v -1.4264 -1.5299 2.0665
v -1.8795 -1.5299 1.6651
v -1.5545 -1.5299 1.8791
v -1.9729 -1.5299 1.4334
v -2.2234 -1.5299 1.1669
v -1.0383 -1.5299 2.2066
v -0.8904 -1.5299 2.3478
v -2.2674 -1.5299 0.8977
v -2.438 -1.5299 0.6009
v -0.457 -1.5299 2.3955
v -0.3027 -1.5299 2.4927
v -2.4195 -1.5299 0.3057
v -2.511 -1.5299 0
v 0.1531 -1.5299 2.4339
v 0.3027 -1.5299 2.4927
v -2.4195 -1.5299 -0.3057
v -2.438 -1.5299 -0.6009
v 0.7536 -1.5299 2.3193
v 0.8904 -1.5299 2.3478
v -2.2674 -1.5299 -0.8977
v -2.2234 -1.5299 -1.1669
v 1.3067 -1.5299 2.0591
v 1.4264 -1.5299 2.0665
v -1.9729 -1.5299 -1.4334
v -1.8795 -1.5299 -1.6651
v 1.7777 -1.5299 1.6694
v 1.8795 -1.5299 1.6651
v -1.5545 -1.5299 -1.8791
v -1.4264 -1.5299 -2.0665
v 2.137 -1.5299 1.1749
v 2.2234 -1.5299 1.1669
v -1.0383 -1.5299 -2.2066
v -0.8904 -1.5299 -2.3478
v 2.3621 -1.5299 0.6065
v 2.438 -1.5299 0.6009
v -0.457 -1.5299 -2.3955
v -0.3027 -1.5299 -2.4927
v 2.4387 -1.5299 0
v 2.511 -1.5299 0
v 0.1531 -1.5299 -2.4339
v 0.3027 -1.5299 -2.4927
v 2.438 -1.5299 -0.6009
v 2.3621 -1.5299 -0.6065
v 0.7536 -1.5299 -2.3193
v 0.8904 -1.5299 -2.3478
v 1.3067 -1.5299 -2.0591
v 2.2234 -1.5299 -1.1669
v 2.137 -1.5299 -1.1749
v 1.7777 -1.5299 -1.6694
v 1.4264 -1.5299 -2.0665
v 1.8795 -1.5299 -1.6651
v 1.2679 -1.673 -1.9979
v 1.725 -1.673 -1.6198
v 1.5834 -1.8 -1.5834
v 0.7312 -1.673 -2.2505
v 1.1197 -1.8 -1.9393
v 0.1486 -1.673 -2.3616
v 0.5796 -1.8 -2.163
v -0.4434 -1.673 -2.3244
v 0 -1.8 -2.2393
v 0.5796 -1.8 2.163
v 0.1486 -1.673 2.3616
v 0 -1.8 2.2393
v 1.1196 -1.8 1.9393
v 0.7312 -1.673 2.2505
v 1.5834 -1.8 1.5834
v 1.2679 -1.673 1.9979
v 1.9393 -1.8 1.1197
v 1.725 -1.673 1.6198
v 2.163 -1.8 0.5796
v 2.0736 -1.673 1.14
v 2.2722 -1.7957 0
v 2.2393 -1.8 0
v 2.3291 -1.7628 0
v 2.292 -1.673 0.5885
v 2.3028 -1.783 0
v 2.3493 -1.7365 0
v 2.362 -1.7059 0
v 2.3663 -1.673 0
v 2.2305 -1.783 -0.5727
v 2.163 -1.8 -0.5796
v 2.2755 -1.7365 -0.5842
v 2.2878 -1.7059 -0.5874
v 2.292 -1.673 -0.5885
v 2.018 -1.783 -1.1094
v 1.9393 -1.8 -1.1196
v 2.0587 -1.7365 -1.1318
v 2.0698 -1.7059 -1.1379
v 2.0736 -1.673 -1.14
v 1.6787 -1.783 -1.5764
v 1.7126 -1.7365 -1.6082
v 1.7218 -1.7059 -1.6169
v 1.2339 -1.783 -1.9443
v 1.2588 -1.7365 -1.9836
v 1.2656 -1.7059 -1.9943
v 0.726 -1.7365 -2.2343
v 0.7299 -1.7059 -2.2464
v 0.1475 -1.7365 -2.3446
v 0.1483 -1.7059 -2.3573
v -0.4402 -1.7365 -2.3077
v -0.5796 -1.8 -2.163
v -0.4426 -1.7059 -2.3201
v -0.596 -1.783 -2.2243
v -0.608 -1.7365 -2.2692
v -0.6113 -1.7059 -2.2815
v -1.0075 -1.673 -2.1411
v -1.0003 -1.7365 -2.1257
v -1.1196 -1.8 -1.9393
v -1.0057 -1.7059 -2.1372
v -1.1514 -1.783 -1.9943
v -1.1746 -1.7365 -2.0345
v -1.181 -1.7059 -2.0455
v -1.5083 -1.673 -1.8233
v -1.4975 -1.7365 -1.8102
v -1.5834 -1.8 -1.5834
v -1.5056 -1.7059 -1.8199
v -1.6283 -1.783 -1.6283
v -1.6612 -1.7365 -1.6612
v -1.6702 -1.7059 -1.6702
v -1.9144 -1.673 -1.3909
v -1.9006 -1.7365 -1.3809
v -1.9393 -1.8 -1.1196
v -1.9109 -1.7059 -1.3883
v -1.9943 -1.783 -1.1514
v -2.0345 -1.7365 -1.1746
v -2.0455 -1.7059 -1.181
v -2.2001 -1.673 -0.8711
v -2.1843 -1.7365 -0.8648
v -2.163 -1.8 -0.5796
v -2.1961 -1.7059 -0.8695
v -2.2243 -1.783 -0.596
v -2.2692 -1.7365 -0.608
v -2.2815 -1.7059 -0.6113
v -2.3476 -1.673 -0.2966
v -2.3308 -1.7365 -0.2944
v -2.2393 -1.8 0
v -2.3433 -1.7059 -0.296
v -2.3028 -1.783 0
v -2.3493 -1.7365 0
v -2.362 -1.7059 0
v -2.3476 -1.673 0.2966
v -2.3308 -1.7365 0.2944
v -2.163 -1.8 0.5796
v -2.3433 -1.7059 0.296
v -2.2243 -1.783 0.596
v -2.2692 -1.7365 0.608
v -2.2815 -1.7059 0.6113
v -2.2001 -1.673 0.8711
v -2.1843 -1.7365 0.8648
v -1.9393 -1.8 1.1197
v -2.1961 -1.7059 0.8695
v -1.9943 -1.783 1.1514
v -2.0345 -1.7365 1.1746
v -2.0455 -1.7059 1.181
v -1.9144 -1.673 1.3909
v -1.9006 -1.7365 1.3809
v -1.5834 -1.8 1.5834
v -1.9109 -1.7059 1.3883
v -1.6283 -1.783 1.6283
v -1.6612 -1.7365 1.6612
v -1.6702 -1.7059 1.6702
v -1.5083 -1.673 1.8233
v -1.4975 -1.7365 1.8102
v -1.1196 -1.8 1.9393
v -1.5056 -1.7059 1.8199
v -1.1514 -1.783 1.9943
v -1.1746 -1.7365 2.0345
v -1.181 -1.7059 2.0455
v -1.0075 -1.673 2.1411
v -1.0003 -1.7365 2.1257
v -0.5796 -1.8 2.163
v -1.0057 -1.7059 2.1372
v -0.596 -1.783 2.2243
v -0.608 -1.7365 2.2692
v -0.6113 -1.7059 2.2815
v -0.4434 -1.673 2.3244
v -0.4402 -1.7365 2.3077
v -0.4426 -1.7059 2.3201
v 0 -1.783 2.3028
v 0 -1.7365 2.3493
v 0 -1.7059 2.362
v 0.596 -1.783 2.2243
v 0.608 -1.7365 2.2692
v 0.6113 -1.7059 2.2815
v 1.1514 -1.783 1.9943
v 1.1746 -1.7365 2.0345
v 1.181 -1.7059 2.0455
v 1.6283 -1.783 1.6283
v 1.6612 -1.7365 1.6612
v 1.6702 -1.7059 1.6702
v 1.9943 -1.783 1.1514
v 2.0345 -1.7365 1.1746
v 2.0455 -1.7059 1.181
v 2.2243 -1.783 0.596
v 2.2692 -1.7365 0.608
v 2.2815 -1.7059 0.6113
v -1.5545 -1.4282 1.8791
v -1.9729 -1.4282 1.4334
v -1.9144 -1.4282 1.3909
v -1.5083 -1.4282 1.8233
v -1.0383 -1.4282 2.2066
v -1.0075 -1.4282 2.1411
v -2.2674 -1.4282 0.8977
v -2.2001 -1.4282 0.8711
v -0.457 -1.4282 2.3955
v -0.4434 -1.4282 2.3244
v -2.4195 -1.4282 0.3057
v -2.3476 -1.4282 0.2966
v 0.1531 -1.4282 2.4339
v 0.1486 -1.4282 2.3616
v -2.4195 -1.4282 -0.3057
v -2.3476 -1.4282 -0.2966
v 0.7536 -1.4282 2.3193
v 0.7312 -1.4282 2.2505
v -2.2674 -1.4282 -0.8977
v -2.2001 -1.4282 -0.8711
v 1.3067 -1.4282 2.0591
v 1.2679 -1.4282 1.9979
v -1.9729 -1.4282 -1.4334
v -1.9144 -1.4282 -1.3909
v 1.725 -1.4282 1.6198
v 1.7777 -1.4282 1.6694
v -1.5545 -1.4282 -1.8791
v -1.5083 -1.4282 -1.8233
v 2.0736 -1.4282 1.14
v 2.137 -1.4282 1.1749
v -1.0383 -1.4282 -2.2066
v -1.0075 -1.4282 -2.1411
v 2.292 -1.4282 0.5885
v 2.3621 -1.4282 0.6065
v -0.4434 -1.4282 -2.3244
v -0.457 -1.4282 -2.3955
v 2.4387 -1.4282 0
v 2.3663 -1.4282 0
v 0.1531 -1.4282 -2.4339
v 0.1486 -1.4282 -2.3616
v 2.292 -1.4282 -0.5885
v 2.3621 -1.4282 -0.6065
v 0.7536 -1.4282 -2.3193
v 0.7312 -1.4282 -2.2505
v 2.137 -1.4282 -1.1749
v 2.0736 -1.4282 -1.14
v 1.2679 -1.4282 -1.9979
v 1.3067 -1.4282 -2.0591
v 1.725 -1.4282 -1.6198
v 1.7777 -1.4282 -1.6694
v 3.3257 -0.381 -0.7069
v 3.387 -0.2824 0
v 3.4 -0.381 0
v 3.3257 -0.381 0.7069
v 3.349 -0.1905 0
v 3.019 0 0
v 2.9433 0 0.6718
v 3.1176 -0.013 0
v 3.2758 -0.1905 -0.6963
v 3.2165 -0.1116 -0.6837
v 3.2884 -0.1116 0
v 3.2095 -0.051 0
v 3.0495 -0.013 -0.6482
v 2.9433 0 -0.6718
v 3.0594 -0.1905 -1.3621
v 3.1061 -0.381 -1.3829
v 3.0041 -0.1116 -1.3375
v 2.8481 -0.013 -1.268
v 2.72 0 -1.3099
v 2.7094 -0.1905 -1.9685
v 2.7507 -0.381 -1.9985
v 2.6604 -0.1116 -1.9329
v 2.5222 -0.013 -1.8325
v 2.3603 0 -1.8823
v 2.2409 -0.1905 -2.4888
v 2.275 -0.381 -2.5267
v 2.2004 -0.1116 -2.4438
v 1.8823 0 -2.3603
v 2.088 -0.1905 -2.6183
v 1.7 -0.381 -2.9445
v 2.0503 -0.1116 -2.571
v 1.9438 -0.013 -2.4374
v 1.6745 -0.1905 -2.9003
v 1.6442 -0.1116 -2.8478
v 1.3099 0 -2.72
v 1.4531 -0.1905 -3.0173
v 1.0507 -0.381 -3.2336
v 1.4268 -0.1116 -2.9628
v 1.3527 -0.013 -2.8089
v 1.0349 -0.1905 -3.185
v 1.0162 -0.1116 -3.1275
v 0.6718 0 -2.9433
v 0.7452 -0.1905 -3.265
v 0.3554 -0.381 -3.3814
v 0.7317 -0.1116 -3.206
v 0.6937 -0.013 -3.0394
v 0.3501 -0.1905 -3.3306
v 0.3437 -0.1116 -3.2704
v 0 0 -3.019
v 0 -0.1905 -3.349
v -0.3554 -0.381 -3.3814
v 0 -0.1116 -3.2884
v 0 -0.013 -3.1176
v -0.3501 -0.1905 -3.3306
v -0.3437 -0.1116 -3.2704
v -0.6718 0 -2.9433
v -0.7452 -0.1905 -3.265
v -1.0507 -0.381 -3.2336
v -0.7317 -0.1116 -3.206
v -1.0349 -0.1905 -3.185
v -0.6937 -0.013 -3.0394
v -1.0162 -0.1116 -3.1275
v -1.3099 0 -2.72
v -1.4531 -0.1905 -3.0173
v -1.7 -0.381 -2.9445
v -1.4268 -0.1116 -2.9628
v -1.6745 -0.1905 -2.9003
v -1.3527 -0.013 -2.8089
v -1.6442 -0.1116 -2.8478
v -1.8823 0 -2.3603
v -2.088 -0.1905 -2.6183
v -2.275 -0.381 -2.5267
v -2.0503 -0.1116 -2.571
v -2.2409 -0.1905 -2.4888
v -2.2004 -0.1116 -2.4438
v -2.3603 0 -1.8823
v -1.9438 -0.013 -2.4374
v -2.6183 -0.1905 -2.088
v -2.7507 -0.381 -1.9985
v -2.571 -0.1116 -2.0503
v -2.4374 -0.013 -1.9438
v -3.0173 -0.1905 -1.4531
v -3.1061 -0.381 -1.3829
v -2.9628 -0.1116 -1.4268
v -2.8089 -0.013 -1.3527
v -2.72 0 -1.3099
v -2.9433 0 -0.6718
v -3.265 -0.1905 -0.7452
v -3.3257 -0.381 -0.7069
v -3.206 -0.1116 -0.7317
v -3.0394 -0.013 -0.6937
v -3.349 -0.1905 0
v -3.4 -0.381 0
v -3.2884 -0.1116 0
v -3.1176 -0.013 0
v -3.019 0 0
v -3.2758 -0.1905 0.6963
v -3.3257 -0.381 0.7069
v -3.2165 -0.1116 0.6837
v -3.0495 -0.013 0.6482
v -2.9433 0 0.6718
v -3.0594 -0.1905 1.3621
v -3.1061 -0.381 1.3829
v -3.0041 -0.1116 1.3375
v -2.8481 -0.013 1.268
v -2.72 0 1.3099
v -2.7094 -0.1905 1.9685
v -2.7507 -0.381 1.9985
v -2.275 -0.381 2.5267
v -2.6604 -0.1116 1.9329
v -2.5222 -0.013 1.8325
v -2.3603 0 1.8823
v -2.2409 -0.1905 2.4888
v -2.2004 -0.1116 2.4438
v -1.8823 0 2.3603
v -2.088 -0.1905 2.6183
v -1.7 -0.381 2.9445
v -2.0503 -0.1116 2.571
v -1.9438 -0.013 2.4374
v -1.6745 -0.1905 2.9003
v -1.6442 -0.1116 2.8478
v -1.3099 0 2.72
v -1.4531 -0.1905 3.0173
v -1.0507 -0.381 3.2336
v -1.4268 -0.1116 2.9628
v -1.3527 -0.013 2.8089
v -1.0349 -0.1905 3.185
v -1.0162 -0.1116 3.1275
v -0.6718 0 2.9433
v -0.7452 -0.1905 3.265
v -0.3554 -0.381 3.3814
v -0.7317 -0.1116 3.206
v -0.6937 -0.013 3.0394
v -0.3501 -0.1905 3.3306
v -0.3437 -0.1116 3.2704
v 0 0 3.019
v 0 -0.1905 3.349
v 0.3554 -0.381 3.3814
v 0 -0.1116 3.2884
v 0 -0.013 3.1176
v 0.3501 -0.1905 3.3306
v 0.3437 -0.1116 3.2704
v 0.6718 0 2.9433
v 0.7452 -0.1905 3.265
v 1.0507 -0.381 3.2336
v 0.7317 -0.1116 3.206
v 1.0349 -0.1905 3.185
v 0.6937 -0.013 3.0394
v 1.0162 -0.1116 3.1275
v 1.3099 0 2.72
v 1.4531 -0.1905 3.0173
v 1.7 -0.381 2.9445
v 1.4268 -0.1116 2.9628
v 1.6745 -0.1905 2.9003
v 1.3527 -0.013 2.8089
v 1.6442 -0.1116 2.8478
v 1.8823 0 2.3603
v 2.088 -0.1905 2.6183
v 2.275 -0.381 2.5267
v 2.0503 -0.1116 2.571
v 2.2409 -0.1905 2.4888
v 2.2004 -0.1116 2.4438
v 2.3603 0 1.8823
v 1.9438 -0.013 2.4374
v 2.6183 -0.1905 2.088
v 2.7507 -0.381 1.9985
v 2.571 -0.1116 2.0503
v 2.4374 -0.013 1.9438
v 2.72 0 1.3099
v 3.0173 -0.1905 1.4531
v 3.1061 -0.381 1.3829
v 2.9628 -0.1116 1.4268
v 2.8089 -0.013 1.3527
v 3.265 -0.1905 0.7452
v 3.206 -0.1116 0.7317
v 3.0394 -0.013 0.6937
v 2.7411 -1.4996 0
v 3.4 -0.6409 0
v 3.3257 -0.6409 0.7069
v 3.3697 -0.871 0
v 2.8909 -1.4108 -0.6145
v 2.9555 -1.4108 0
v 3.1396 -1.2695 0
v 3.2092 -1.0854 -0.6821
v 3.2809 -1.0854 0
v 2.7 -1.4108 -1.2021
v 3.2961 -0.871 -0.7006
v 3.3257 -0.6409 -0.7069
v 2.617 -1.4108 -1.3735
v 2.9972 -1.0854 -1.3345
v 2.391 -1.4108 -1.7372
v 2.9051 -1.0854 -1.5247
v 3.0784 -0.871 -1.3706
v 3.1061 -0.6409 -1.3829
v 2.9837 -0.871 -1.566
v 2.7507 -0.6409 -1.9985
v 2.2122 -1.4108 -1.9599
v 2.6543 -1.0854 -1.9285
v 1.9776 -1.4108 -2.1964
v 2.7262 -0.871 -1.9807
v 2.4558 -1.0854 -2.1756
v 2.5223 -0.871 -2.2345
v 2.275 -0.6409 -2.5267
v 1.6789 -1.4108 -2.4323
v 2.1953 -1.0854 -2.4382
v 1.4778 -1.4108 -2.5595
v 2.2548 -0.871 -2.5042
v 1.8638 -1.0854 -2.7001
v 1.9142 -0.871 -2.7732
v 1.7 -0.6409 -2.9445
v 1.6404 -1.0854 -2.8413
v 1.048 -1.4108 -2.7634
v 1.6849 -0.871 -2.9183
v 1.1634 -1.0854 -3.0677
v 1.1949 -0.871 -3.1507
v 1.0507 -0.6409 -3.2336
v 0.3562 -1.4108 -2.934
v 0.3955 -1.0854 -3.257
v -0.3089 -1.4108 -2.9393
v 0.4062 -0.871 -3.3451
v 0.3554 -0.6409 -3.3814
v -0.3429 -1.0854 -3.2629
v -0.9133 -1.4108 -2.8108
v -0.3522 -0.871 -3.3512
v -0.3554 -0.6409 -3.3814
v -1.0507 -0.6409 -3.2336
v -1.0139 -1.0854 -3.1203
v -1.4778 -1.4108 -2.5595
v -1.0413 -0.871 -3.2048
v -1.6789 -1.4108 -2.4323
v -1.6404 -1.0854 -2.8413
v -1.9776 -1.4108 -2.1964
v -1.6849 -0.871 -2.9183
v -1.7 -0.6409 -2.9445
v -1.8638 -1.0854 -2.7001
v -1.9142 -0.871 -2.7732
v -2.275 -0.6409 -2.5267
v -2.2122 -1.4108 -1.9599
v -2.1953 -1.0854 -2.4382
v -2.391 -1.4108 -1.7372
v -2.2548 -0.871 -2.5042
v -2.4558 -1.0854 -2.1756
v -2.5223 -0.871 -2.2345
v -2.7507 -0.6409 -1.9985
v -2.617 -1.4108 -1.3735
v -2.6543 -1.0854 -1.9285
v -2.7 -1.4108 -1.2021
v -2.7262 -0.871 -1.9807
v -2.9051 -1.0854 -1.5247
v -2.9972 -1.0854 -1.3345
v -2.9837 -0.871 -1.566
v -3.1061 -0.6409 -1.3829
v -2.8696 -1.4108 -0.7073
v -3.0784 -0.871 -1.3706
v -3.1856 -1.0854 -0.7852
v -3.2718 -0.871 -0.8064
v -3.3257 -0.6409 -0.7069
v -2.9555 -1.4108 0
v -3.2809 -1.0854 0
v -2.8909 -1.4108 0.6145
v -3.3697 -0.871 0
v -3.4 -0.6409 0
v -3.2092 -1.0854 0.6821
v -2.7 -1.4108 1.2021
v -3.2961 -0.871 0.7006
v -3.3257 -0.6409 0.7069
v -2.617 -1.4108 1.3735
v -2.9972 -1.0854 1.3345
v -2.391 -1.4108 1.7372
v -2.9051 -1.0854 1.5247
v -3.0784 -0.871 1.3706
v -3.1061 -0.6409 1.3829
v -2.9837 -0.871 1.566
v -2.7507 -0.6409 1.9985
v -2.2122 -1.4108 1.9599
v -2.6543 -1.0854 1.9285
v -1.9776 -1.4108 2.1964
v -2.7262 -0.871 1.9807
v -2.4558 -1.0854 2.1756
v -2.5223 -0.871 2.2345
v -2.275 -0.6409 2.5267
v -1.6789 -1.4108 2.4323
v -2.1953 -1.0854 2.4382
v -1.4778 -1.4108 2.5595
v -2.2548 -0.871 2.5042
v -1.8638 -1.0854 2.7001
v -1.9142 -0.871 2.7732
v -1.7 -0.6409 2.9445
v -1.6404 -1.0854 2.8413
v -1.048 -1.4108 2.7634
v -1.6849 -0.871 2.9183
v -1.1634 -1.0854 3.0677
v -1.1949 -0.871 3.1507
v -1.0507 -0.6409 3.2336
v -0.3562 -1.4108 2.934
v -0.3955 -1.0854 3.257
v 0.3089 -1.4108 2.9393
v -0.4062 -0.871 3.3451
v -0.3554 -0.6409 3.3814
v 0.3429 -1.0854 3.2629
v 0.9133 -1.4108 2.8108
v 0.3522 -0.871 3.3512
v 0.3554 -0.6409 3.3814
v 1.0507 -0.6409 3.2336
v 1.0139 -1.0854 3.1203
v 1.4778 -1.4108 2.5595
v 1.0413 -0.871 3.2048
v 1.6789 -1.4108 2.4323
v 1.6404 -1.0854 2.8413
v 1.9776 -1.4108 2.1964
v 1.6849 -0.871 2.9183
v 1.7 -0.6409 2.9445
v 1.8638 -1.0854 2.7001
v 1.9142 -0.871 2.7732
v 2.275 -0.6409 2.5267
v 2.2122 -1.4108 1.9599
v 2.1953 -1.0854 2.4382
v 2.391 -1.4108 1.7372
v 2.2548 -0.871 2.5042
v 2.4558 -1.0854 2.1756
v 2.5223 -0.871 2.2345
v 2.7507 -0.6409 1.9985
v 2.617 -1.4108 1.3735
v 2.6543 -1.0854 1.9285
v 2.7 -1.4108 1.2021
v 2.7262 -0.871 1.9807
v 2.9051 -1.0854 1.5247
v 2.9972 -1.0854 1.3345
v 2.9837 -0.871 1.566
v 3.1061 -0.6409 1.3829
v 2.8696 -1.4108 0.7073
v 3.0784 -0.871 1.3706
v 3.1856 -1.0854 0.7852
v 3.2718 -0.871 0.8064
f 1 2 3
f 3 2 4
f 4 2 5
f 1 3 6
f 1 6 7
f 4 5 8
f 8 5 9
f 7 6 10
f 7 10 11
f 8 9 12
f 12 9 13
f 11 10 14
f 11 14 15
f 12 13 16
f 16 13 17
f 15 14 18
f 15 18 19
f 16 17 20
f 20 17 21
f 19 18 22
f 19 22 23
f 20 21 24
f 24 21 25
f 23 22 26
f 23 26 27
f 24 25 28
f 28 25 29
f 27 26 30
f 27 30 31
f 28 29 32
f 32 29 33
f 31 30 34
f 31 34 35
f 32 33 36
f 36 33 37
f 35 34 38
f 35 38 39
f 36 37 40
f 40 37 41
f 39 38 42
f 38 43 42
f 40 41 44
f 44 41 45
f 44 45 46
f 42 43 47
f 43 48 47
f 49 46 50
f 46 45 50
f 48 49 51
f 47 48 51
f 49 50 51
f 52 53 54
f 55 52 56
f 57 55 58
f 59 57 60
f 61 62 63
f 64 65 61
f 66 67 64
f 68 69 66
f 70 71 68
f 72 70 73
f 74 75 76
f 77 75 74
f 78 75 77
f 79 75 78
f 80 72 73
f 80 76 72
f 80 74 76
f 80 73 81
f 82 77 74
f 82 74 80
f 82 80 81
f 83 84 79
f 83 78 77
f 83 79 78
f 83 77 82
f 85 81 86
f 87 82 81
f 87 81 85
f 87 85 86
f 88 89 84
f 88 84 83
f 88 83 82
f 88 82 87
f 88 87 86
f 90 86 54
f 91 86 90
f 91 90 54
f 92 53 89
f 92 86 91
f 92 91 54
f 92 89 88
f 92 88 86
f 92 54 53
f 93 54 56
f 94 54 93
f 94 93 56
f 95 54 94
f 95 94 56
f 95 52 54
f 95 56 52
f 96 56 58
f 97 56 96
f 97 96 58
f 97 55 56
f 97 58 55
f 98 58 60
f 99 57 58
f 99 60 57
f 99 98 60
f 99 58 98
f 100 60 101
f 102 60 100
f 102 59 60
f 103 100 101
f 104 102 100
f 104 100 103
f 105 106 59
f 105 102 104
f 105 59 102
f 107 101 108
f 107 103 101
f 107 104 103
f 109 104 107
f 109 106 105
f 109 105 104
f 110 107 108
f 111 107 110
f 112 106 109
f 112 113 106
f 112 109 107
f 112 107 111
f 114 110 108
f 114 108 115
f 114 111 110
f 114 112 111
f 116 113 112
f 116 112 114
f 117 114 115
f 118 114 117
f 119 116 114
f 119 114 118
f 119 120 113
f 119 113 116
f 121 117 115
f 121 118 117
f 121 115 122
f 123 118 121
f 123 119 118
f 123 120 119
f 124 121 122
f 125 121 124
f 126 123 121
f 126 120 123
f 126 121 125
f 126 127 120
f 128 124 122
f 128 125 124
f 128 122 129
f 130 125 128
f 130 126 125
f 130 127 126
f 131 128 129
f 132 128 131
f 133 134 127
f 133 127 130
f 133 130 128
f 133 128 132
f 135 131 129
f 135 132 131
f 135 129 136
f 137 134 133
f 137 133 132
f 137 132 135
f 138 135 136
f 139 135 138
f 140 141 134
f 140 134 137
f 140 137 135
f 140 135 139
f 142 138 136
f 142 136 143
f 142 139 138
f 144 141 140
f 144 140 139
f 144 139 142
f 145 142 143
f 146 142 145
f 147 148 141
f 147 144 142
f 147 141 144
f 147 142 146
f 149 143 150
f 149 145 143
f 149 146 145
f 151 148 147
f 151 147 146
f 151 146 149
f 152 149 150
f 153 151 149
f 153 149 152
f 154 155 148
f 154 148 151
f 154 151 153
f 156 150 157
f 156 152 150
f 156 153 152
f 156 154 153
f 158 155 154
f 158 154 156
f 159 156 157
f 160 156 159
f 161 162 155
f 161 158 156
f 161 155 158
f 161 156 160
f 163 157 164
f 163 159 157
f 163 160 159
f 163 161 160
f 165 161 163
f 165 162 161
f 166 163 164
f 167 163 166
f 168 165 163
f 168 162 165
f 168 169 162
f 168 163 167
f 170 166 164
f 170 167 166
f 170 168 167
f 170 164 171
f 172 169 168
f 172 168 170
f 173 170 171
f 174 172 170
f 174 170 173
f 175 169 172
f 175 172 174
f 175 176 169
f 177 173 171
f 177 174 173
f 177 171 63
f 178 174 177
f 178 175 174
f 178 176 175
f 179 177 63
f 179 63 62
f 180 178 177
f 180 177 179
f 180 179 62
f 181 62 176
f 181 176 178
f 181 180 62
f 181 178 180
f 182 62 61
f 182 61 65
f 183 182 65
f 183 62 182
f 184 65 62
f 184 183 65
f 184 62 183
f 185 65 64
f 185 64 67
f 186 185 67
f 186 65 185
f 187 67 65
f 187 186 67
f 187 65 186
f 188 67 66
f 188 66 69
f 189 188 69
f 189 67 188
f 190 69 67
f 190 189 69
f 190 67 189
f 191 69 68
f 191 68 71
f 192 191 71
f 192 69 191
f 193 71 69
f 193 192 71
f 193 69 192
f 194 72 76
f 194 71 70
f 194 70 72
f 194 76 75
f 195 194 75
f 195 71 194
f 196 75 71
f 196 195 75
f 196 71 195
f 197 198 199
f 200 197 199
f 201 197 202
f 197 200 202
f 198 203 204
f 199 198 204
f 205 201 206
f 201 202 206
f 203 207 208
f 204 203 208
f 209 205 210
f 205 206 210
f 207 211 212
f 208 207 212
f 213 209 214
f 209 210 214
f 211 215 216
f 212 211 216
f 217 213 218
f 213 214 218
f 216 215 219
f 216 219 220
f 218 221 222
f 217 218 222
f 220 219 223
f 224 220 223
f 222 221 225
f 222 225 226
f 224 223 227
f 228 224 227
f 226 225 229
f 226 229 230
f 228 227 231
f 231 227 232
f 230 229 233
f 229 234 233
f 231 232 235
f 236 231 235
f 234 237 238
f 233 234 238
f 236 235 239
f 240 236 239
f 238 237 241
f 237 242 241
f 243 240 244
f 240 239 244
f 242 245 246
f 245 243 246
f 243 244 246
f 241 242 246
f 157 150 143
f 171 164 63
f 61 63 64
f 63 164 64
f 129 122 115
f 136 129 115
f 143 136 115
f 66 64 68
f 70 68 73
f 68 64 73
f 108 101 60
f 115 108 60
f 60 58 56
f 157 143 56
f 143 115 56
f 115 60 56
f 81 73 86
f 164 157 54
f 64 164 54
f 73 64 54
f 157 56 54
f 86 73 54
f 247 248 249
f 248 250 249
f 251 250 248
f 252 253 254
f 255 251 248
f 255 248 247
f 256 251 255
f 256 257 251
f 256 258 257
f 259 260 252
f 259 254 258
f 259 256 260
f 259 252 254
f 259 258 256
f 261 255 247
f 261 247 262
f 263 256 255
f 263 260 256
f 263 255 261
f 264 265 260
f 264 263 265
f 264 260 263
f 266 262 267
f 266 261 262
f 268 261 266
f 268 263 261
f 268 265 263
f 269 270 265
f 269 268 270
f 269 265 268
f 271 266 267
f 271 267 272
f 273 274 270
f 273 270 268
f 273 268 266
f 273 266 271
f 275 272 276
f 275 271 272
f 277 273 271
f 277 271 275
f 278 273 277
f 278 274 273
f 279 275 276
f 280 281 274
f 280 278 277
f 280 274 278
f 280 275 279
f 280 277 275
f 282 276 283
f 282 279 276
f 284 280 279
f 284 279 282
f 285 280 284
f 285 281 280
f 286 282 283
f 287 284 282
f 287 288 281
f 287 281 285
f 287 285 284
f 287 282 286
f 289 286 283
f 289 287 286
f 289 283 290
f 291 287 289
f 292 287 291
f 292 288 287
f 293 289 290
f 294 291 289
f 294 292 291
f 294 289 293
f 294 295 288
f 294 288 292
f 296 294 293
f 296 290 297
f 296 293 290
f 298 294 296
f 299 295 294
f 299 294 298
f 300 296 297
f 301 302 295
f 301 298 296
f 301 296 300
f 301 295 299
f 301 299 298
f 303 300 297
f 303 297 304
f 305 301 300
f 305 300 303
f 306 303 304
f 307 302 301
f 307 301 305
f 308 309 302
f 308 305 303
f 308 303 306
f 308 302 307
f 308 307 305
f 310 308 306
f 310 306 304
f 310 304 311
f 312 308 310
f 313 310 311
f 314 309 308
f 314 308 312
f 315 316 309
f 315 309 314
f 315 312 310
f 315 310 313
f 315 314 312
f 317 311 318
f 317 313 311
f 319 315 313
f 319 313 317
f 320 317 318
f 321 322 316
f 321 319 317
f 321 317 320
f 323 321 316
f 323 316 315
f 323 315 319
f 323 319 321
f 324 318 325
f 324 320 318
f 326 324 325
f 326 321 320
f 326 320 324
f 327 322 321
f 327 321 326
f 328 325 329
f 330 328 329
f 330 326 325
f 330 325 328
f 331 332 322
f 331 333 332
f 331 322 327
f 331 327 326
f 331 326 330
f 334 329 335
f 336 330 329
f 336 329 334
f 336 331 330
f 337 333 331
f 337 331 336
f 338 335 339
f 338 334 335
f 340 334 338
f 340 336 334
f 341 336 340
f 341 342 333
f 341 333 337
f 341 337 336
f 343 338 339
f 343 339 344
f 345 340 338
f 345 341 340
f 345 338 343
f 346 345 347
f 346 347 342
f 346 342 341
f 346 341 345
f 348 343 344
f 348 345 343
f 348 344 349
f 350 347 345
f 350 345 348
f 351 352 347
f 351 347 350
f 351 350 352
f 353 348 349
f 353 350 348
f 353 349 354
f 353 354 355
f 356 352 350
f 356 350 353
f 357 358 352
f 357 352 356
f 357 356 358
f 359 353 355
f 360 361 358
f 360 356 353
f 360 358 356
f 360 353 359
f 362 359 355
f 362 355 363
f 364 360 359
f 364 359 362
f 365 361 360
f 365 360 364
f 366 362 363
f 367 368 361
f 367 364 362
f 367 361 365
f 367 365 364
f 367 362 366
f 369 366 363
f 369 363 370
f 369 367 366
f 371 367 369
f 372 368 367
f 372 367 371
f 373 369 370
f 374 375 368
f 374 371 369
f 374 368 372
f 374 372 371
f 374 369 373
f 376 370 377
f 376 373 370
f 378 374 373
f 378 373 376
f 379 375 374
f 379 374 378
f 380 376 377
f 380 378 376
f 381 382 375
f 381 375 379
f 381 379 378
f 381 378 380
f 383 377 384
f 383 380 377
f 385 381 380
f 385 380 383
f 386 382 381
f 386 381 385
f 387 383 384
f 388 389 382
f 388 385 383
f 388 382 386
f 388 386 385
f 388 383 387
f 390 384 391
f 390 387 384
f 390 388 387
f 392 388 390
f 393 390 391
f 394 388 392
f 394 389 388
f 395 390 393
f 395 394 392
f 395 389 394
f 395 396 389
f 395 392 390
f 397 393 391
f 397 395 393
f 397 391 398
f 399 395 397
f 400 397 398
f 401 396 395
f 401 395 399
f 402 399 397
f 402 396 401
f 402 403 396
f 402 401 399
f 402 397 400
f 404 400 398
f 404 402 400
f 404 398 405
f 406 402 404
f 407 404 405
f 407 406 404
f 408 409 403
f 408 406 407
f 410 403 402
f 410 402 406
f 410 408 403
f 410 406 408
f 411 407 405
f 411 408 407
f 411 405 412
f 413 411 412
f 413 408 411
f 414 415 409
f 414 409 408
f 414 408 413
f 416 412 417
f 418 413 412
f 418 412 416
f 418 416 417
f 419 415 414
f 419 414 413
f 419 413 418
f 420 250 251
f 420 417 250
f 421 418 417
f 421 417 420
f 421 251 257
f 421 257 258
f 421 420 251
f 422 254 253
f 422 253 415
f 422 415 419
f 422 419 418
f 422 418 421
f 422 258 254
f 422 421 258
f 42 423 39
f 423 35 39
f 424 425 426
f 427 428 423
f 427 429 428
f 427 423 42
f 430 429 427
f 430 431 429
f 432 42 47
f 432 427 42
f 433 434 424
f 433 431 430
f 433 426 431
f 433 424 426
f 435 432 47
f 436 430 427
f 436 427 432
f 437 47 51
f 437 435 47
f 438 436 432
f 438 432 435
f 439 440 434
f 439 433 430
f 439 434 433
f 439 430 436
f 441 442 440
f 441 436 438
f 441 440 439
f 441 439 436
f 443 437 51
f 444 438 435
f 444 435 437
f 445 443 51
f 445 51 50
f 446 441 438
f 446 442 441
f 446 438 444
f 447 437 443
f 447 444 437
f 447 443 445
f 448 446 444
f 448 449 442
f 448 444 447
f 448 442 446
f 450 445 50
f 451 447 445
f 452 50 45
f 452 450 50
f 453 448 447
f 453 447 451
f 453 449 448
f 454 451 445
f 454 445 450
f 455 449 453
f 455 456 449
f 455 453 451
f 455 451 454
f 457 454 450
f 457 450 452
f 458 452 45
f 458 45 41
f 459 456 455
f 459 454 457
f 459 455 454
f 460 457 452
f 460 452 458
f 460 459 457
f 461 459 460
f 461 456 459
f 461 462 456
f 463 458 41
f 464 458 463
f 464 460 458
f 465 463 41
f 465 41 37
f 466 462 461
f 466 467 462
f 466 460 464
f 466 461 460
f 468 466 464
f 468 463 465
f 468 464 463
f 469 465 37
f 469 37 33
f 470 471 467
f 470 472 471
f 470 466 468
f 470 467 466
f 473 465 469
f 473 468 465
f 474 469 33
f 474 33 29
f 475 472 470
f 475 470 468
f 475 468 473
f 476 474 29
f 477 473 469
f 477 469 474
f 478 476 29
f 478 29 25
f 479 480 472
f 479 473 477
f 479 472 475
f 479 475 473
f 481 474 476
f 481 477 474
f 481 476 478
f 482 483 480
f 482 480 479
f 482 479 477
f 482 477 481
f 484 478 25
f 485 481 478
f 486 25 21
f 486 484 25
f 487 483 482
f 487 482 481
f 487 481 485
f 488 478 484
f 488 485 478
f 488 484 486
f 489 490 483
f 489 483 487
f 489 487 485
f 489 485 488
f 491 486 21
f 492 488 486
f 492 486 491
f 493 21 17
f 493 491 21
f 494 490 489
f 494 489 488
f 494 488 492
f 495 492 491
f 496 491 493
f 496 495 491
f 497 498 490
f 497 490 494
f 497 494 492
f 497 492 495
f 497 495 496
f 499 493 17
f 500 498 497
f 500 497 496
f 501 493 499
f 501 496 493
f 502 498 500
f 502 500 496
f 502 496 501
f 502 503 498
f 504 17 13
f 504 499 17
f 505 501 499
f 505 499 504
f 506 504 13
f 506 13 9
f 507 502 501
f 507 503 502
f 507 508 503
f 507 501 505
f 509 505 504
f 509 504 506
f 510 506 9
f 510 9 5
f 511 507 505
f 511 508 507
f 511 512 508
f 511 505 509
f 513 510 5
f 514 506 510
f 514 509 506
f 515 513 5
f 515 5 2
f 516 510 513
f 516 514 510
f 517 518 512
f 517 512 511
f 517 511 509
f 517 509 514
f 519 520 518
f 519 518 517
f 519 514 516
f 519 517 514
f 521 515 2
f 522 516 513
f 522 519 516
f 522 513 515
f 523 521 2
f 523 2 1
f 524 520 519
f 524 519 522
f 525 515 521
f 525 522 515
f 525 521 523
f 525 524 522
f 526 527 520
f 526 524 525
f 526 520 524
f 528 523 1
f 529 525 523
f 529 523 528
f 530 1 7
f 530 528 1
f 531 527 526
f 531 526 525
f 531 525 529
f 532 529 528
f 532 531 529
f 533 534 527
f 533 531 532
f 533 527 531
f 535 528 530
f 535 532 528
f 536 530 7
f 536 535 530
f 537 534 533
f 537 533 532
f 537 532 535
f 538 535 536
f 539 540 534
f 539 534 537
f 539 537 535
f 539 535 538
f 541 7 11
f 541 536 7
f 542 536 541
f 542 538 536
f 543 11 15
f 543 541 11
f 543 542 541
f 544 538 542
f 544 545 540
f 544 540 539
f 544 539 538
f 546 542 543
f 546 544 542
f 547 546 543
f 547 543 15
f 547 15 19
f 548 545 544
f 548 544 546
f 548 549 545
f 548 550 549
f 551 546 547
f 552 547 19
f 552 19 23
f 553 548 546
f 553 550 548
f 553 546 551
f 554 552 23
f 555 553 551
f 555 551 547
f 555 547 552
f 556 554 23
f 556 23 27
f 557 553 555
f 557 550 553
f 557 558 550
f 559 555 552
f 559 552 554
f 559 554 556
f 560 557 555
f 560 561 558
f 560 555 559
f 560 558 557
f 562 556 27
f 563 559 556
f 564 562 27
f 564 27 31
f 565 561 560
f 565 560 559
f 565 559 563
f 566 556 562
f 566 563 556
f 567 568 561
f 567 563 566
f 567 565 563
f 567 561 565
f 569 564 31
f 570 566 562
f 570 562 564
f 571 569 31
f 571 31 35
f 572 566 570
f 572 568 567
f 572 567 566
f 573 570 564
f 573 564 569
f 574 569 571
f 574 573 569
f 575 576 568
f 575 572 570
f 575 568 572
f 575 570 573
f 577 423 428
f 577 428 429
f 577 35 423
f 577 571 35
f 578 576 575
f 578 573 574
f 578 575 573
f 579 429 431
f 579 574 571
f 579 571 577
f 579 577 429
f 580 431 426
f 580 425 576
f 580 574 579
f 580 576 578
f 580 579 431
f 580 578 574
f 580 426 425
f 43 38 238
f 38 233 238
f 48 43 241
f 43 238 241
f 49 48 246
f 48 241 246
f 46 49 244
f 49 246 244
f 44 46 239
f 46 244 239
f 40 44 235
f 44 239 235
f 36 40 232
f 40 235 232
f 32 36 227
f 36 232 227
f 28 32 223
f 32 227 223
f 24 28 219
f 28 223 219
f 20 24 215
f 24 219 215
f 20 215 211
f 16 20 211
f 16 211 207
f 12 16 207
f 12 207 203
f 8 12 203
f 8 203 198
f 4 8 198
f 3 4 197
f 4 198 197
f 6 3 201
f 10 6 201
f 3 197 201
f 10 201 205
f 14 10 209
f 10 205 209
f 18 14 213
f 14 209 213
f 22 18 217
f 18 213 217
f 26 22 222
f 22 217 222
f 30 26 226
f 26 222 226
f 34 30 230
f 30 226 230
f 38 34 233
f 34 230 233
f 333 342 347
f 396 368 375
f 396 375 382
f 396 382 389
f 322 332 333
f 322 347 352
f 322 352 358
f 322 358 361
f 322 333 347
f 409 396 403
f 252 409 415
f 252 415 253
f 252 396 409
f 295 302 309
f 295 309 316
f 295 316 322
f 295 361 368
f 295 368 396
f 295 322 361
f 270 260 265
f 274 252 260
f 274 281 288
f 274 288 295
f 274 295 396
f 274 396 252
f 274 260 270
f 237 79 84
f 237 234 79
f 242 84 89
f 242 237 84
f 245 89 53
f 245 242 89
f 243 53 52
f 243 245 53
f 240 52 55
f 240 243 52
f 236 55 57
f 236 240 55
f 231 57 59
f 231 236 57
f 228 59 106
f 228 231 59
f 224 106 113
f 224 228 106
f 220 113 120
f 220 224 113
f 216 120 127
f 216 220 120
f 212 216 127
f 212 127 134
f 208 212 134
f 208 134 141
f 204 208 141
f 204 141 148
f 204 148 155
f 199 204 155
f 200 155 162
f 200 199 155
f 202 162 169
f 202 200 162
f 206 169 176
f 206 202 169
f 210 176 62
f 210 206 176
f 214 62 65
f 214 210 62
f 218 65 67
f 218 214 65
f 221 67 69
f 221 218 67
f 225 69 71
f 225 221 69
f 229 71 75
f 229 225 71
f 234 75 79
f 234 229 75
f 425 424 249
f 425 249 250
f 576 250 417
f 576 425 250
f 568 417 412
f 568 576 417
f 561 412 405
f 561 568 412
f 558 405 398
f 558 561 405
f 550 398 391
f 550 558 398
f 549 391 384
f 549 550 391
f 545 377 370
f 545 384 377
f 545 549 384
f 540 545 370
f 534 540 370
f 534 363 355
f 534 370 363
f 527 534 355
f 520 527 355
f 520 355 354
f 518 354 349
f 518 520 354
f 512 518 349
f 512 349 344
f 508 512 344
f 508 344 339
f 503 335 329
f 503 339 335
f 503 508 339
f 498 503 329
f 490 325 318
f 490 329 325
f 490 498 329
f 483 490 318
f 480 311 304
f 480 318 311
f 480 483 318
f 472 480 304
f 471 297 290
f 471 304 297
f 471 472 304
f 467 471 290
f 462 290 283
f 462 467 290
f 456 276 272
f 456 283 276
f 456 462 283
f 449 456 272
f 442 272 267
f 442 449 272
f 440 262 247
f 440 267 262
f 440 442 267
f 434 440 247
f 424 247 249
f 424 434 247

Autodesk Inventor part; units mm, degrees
ref_plane "YZ Plane" through (0, 0, 0) normal (1, 0, 0) x (0, 1, 0)
ref_plane "XZ Plane" through (0, 0, 0) normal (0, 1, 0) x (-1, 0, 0)
ref_plane "XY Plane" through (0, 0, 0) normal (0, 0, 1) x (1, 0, 0)
sketch "Sketch1" plane through (0, 0, 0) normal (0, 0, 1) x (1, 0, 0)
  line L0 (0, 0) -> (3.019, 0)
  line L1 (3.4, -0.381) -> (3.4, -0.6409)
  line L2 (0, -1.8) -> (0, 0)
  line L3 (0, -1.8) -> (2.2393, -1.8)
  line L4 (2.3663, -1.673) -> (2.3663, -1.4282)
  line L5 (0, -1.3716) -> (0, -1.8)
  arc A0 (3.4, -0.381) -> (3.019, 0) centre (3.019, -0.381) ccw
  line L6 (2.4387, -1.5299) -> (2.511, -1.5299)
  arc A1 (2.511, -1.5299) -> (3.4, -0.6409) centre (2.511, -0.6409) ccw
  arc A2 (2.2393, -1.8) -> (2.3663, -1.673) centre (2.2393, -1.673) ccw
  line L7 (2.4387, -1.5299) -> (2.4387, -1.4282)
  line L8 (2.4387, -1.4282) -> (2.3663, -1.4282)
  point P0 (3.4, 0)
  dimension "d2" = 0.381
  dimension "d3" = 0.889
  dimension "d4" = 0.127
revolve "Revolution1" add sketch "Sketch1" angle 360 about axis through (0, -1.8, 0) along (0, 1, 0)
properties part number "SuperCap_PAS614L" material "Silver"
